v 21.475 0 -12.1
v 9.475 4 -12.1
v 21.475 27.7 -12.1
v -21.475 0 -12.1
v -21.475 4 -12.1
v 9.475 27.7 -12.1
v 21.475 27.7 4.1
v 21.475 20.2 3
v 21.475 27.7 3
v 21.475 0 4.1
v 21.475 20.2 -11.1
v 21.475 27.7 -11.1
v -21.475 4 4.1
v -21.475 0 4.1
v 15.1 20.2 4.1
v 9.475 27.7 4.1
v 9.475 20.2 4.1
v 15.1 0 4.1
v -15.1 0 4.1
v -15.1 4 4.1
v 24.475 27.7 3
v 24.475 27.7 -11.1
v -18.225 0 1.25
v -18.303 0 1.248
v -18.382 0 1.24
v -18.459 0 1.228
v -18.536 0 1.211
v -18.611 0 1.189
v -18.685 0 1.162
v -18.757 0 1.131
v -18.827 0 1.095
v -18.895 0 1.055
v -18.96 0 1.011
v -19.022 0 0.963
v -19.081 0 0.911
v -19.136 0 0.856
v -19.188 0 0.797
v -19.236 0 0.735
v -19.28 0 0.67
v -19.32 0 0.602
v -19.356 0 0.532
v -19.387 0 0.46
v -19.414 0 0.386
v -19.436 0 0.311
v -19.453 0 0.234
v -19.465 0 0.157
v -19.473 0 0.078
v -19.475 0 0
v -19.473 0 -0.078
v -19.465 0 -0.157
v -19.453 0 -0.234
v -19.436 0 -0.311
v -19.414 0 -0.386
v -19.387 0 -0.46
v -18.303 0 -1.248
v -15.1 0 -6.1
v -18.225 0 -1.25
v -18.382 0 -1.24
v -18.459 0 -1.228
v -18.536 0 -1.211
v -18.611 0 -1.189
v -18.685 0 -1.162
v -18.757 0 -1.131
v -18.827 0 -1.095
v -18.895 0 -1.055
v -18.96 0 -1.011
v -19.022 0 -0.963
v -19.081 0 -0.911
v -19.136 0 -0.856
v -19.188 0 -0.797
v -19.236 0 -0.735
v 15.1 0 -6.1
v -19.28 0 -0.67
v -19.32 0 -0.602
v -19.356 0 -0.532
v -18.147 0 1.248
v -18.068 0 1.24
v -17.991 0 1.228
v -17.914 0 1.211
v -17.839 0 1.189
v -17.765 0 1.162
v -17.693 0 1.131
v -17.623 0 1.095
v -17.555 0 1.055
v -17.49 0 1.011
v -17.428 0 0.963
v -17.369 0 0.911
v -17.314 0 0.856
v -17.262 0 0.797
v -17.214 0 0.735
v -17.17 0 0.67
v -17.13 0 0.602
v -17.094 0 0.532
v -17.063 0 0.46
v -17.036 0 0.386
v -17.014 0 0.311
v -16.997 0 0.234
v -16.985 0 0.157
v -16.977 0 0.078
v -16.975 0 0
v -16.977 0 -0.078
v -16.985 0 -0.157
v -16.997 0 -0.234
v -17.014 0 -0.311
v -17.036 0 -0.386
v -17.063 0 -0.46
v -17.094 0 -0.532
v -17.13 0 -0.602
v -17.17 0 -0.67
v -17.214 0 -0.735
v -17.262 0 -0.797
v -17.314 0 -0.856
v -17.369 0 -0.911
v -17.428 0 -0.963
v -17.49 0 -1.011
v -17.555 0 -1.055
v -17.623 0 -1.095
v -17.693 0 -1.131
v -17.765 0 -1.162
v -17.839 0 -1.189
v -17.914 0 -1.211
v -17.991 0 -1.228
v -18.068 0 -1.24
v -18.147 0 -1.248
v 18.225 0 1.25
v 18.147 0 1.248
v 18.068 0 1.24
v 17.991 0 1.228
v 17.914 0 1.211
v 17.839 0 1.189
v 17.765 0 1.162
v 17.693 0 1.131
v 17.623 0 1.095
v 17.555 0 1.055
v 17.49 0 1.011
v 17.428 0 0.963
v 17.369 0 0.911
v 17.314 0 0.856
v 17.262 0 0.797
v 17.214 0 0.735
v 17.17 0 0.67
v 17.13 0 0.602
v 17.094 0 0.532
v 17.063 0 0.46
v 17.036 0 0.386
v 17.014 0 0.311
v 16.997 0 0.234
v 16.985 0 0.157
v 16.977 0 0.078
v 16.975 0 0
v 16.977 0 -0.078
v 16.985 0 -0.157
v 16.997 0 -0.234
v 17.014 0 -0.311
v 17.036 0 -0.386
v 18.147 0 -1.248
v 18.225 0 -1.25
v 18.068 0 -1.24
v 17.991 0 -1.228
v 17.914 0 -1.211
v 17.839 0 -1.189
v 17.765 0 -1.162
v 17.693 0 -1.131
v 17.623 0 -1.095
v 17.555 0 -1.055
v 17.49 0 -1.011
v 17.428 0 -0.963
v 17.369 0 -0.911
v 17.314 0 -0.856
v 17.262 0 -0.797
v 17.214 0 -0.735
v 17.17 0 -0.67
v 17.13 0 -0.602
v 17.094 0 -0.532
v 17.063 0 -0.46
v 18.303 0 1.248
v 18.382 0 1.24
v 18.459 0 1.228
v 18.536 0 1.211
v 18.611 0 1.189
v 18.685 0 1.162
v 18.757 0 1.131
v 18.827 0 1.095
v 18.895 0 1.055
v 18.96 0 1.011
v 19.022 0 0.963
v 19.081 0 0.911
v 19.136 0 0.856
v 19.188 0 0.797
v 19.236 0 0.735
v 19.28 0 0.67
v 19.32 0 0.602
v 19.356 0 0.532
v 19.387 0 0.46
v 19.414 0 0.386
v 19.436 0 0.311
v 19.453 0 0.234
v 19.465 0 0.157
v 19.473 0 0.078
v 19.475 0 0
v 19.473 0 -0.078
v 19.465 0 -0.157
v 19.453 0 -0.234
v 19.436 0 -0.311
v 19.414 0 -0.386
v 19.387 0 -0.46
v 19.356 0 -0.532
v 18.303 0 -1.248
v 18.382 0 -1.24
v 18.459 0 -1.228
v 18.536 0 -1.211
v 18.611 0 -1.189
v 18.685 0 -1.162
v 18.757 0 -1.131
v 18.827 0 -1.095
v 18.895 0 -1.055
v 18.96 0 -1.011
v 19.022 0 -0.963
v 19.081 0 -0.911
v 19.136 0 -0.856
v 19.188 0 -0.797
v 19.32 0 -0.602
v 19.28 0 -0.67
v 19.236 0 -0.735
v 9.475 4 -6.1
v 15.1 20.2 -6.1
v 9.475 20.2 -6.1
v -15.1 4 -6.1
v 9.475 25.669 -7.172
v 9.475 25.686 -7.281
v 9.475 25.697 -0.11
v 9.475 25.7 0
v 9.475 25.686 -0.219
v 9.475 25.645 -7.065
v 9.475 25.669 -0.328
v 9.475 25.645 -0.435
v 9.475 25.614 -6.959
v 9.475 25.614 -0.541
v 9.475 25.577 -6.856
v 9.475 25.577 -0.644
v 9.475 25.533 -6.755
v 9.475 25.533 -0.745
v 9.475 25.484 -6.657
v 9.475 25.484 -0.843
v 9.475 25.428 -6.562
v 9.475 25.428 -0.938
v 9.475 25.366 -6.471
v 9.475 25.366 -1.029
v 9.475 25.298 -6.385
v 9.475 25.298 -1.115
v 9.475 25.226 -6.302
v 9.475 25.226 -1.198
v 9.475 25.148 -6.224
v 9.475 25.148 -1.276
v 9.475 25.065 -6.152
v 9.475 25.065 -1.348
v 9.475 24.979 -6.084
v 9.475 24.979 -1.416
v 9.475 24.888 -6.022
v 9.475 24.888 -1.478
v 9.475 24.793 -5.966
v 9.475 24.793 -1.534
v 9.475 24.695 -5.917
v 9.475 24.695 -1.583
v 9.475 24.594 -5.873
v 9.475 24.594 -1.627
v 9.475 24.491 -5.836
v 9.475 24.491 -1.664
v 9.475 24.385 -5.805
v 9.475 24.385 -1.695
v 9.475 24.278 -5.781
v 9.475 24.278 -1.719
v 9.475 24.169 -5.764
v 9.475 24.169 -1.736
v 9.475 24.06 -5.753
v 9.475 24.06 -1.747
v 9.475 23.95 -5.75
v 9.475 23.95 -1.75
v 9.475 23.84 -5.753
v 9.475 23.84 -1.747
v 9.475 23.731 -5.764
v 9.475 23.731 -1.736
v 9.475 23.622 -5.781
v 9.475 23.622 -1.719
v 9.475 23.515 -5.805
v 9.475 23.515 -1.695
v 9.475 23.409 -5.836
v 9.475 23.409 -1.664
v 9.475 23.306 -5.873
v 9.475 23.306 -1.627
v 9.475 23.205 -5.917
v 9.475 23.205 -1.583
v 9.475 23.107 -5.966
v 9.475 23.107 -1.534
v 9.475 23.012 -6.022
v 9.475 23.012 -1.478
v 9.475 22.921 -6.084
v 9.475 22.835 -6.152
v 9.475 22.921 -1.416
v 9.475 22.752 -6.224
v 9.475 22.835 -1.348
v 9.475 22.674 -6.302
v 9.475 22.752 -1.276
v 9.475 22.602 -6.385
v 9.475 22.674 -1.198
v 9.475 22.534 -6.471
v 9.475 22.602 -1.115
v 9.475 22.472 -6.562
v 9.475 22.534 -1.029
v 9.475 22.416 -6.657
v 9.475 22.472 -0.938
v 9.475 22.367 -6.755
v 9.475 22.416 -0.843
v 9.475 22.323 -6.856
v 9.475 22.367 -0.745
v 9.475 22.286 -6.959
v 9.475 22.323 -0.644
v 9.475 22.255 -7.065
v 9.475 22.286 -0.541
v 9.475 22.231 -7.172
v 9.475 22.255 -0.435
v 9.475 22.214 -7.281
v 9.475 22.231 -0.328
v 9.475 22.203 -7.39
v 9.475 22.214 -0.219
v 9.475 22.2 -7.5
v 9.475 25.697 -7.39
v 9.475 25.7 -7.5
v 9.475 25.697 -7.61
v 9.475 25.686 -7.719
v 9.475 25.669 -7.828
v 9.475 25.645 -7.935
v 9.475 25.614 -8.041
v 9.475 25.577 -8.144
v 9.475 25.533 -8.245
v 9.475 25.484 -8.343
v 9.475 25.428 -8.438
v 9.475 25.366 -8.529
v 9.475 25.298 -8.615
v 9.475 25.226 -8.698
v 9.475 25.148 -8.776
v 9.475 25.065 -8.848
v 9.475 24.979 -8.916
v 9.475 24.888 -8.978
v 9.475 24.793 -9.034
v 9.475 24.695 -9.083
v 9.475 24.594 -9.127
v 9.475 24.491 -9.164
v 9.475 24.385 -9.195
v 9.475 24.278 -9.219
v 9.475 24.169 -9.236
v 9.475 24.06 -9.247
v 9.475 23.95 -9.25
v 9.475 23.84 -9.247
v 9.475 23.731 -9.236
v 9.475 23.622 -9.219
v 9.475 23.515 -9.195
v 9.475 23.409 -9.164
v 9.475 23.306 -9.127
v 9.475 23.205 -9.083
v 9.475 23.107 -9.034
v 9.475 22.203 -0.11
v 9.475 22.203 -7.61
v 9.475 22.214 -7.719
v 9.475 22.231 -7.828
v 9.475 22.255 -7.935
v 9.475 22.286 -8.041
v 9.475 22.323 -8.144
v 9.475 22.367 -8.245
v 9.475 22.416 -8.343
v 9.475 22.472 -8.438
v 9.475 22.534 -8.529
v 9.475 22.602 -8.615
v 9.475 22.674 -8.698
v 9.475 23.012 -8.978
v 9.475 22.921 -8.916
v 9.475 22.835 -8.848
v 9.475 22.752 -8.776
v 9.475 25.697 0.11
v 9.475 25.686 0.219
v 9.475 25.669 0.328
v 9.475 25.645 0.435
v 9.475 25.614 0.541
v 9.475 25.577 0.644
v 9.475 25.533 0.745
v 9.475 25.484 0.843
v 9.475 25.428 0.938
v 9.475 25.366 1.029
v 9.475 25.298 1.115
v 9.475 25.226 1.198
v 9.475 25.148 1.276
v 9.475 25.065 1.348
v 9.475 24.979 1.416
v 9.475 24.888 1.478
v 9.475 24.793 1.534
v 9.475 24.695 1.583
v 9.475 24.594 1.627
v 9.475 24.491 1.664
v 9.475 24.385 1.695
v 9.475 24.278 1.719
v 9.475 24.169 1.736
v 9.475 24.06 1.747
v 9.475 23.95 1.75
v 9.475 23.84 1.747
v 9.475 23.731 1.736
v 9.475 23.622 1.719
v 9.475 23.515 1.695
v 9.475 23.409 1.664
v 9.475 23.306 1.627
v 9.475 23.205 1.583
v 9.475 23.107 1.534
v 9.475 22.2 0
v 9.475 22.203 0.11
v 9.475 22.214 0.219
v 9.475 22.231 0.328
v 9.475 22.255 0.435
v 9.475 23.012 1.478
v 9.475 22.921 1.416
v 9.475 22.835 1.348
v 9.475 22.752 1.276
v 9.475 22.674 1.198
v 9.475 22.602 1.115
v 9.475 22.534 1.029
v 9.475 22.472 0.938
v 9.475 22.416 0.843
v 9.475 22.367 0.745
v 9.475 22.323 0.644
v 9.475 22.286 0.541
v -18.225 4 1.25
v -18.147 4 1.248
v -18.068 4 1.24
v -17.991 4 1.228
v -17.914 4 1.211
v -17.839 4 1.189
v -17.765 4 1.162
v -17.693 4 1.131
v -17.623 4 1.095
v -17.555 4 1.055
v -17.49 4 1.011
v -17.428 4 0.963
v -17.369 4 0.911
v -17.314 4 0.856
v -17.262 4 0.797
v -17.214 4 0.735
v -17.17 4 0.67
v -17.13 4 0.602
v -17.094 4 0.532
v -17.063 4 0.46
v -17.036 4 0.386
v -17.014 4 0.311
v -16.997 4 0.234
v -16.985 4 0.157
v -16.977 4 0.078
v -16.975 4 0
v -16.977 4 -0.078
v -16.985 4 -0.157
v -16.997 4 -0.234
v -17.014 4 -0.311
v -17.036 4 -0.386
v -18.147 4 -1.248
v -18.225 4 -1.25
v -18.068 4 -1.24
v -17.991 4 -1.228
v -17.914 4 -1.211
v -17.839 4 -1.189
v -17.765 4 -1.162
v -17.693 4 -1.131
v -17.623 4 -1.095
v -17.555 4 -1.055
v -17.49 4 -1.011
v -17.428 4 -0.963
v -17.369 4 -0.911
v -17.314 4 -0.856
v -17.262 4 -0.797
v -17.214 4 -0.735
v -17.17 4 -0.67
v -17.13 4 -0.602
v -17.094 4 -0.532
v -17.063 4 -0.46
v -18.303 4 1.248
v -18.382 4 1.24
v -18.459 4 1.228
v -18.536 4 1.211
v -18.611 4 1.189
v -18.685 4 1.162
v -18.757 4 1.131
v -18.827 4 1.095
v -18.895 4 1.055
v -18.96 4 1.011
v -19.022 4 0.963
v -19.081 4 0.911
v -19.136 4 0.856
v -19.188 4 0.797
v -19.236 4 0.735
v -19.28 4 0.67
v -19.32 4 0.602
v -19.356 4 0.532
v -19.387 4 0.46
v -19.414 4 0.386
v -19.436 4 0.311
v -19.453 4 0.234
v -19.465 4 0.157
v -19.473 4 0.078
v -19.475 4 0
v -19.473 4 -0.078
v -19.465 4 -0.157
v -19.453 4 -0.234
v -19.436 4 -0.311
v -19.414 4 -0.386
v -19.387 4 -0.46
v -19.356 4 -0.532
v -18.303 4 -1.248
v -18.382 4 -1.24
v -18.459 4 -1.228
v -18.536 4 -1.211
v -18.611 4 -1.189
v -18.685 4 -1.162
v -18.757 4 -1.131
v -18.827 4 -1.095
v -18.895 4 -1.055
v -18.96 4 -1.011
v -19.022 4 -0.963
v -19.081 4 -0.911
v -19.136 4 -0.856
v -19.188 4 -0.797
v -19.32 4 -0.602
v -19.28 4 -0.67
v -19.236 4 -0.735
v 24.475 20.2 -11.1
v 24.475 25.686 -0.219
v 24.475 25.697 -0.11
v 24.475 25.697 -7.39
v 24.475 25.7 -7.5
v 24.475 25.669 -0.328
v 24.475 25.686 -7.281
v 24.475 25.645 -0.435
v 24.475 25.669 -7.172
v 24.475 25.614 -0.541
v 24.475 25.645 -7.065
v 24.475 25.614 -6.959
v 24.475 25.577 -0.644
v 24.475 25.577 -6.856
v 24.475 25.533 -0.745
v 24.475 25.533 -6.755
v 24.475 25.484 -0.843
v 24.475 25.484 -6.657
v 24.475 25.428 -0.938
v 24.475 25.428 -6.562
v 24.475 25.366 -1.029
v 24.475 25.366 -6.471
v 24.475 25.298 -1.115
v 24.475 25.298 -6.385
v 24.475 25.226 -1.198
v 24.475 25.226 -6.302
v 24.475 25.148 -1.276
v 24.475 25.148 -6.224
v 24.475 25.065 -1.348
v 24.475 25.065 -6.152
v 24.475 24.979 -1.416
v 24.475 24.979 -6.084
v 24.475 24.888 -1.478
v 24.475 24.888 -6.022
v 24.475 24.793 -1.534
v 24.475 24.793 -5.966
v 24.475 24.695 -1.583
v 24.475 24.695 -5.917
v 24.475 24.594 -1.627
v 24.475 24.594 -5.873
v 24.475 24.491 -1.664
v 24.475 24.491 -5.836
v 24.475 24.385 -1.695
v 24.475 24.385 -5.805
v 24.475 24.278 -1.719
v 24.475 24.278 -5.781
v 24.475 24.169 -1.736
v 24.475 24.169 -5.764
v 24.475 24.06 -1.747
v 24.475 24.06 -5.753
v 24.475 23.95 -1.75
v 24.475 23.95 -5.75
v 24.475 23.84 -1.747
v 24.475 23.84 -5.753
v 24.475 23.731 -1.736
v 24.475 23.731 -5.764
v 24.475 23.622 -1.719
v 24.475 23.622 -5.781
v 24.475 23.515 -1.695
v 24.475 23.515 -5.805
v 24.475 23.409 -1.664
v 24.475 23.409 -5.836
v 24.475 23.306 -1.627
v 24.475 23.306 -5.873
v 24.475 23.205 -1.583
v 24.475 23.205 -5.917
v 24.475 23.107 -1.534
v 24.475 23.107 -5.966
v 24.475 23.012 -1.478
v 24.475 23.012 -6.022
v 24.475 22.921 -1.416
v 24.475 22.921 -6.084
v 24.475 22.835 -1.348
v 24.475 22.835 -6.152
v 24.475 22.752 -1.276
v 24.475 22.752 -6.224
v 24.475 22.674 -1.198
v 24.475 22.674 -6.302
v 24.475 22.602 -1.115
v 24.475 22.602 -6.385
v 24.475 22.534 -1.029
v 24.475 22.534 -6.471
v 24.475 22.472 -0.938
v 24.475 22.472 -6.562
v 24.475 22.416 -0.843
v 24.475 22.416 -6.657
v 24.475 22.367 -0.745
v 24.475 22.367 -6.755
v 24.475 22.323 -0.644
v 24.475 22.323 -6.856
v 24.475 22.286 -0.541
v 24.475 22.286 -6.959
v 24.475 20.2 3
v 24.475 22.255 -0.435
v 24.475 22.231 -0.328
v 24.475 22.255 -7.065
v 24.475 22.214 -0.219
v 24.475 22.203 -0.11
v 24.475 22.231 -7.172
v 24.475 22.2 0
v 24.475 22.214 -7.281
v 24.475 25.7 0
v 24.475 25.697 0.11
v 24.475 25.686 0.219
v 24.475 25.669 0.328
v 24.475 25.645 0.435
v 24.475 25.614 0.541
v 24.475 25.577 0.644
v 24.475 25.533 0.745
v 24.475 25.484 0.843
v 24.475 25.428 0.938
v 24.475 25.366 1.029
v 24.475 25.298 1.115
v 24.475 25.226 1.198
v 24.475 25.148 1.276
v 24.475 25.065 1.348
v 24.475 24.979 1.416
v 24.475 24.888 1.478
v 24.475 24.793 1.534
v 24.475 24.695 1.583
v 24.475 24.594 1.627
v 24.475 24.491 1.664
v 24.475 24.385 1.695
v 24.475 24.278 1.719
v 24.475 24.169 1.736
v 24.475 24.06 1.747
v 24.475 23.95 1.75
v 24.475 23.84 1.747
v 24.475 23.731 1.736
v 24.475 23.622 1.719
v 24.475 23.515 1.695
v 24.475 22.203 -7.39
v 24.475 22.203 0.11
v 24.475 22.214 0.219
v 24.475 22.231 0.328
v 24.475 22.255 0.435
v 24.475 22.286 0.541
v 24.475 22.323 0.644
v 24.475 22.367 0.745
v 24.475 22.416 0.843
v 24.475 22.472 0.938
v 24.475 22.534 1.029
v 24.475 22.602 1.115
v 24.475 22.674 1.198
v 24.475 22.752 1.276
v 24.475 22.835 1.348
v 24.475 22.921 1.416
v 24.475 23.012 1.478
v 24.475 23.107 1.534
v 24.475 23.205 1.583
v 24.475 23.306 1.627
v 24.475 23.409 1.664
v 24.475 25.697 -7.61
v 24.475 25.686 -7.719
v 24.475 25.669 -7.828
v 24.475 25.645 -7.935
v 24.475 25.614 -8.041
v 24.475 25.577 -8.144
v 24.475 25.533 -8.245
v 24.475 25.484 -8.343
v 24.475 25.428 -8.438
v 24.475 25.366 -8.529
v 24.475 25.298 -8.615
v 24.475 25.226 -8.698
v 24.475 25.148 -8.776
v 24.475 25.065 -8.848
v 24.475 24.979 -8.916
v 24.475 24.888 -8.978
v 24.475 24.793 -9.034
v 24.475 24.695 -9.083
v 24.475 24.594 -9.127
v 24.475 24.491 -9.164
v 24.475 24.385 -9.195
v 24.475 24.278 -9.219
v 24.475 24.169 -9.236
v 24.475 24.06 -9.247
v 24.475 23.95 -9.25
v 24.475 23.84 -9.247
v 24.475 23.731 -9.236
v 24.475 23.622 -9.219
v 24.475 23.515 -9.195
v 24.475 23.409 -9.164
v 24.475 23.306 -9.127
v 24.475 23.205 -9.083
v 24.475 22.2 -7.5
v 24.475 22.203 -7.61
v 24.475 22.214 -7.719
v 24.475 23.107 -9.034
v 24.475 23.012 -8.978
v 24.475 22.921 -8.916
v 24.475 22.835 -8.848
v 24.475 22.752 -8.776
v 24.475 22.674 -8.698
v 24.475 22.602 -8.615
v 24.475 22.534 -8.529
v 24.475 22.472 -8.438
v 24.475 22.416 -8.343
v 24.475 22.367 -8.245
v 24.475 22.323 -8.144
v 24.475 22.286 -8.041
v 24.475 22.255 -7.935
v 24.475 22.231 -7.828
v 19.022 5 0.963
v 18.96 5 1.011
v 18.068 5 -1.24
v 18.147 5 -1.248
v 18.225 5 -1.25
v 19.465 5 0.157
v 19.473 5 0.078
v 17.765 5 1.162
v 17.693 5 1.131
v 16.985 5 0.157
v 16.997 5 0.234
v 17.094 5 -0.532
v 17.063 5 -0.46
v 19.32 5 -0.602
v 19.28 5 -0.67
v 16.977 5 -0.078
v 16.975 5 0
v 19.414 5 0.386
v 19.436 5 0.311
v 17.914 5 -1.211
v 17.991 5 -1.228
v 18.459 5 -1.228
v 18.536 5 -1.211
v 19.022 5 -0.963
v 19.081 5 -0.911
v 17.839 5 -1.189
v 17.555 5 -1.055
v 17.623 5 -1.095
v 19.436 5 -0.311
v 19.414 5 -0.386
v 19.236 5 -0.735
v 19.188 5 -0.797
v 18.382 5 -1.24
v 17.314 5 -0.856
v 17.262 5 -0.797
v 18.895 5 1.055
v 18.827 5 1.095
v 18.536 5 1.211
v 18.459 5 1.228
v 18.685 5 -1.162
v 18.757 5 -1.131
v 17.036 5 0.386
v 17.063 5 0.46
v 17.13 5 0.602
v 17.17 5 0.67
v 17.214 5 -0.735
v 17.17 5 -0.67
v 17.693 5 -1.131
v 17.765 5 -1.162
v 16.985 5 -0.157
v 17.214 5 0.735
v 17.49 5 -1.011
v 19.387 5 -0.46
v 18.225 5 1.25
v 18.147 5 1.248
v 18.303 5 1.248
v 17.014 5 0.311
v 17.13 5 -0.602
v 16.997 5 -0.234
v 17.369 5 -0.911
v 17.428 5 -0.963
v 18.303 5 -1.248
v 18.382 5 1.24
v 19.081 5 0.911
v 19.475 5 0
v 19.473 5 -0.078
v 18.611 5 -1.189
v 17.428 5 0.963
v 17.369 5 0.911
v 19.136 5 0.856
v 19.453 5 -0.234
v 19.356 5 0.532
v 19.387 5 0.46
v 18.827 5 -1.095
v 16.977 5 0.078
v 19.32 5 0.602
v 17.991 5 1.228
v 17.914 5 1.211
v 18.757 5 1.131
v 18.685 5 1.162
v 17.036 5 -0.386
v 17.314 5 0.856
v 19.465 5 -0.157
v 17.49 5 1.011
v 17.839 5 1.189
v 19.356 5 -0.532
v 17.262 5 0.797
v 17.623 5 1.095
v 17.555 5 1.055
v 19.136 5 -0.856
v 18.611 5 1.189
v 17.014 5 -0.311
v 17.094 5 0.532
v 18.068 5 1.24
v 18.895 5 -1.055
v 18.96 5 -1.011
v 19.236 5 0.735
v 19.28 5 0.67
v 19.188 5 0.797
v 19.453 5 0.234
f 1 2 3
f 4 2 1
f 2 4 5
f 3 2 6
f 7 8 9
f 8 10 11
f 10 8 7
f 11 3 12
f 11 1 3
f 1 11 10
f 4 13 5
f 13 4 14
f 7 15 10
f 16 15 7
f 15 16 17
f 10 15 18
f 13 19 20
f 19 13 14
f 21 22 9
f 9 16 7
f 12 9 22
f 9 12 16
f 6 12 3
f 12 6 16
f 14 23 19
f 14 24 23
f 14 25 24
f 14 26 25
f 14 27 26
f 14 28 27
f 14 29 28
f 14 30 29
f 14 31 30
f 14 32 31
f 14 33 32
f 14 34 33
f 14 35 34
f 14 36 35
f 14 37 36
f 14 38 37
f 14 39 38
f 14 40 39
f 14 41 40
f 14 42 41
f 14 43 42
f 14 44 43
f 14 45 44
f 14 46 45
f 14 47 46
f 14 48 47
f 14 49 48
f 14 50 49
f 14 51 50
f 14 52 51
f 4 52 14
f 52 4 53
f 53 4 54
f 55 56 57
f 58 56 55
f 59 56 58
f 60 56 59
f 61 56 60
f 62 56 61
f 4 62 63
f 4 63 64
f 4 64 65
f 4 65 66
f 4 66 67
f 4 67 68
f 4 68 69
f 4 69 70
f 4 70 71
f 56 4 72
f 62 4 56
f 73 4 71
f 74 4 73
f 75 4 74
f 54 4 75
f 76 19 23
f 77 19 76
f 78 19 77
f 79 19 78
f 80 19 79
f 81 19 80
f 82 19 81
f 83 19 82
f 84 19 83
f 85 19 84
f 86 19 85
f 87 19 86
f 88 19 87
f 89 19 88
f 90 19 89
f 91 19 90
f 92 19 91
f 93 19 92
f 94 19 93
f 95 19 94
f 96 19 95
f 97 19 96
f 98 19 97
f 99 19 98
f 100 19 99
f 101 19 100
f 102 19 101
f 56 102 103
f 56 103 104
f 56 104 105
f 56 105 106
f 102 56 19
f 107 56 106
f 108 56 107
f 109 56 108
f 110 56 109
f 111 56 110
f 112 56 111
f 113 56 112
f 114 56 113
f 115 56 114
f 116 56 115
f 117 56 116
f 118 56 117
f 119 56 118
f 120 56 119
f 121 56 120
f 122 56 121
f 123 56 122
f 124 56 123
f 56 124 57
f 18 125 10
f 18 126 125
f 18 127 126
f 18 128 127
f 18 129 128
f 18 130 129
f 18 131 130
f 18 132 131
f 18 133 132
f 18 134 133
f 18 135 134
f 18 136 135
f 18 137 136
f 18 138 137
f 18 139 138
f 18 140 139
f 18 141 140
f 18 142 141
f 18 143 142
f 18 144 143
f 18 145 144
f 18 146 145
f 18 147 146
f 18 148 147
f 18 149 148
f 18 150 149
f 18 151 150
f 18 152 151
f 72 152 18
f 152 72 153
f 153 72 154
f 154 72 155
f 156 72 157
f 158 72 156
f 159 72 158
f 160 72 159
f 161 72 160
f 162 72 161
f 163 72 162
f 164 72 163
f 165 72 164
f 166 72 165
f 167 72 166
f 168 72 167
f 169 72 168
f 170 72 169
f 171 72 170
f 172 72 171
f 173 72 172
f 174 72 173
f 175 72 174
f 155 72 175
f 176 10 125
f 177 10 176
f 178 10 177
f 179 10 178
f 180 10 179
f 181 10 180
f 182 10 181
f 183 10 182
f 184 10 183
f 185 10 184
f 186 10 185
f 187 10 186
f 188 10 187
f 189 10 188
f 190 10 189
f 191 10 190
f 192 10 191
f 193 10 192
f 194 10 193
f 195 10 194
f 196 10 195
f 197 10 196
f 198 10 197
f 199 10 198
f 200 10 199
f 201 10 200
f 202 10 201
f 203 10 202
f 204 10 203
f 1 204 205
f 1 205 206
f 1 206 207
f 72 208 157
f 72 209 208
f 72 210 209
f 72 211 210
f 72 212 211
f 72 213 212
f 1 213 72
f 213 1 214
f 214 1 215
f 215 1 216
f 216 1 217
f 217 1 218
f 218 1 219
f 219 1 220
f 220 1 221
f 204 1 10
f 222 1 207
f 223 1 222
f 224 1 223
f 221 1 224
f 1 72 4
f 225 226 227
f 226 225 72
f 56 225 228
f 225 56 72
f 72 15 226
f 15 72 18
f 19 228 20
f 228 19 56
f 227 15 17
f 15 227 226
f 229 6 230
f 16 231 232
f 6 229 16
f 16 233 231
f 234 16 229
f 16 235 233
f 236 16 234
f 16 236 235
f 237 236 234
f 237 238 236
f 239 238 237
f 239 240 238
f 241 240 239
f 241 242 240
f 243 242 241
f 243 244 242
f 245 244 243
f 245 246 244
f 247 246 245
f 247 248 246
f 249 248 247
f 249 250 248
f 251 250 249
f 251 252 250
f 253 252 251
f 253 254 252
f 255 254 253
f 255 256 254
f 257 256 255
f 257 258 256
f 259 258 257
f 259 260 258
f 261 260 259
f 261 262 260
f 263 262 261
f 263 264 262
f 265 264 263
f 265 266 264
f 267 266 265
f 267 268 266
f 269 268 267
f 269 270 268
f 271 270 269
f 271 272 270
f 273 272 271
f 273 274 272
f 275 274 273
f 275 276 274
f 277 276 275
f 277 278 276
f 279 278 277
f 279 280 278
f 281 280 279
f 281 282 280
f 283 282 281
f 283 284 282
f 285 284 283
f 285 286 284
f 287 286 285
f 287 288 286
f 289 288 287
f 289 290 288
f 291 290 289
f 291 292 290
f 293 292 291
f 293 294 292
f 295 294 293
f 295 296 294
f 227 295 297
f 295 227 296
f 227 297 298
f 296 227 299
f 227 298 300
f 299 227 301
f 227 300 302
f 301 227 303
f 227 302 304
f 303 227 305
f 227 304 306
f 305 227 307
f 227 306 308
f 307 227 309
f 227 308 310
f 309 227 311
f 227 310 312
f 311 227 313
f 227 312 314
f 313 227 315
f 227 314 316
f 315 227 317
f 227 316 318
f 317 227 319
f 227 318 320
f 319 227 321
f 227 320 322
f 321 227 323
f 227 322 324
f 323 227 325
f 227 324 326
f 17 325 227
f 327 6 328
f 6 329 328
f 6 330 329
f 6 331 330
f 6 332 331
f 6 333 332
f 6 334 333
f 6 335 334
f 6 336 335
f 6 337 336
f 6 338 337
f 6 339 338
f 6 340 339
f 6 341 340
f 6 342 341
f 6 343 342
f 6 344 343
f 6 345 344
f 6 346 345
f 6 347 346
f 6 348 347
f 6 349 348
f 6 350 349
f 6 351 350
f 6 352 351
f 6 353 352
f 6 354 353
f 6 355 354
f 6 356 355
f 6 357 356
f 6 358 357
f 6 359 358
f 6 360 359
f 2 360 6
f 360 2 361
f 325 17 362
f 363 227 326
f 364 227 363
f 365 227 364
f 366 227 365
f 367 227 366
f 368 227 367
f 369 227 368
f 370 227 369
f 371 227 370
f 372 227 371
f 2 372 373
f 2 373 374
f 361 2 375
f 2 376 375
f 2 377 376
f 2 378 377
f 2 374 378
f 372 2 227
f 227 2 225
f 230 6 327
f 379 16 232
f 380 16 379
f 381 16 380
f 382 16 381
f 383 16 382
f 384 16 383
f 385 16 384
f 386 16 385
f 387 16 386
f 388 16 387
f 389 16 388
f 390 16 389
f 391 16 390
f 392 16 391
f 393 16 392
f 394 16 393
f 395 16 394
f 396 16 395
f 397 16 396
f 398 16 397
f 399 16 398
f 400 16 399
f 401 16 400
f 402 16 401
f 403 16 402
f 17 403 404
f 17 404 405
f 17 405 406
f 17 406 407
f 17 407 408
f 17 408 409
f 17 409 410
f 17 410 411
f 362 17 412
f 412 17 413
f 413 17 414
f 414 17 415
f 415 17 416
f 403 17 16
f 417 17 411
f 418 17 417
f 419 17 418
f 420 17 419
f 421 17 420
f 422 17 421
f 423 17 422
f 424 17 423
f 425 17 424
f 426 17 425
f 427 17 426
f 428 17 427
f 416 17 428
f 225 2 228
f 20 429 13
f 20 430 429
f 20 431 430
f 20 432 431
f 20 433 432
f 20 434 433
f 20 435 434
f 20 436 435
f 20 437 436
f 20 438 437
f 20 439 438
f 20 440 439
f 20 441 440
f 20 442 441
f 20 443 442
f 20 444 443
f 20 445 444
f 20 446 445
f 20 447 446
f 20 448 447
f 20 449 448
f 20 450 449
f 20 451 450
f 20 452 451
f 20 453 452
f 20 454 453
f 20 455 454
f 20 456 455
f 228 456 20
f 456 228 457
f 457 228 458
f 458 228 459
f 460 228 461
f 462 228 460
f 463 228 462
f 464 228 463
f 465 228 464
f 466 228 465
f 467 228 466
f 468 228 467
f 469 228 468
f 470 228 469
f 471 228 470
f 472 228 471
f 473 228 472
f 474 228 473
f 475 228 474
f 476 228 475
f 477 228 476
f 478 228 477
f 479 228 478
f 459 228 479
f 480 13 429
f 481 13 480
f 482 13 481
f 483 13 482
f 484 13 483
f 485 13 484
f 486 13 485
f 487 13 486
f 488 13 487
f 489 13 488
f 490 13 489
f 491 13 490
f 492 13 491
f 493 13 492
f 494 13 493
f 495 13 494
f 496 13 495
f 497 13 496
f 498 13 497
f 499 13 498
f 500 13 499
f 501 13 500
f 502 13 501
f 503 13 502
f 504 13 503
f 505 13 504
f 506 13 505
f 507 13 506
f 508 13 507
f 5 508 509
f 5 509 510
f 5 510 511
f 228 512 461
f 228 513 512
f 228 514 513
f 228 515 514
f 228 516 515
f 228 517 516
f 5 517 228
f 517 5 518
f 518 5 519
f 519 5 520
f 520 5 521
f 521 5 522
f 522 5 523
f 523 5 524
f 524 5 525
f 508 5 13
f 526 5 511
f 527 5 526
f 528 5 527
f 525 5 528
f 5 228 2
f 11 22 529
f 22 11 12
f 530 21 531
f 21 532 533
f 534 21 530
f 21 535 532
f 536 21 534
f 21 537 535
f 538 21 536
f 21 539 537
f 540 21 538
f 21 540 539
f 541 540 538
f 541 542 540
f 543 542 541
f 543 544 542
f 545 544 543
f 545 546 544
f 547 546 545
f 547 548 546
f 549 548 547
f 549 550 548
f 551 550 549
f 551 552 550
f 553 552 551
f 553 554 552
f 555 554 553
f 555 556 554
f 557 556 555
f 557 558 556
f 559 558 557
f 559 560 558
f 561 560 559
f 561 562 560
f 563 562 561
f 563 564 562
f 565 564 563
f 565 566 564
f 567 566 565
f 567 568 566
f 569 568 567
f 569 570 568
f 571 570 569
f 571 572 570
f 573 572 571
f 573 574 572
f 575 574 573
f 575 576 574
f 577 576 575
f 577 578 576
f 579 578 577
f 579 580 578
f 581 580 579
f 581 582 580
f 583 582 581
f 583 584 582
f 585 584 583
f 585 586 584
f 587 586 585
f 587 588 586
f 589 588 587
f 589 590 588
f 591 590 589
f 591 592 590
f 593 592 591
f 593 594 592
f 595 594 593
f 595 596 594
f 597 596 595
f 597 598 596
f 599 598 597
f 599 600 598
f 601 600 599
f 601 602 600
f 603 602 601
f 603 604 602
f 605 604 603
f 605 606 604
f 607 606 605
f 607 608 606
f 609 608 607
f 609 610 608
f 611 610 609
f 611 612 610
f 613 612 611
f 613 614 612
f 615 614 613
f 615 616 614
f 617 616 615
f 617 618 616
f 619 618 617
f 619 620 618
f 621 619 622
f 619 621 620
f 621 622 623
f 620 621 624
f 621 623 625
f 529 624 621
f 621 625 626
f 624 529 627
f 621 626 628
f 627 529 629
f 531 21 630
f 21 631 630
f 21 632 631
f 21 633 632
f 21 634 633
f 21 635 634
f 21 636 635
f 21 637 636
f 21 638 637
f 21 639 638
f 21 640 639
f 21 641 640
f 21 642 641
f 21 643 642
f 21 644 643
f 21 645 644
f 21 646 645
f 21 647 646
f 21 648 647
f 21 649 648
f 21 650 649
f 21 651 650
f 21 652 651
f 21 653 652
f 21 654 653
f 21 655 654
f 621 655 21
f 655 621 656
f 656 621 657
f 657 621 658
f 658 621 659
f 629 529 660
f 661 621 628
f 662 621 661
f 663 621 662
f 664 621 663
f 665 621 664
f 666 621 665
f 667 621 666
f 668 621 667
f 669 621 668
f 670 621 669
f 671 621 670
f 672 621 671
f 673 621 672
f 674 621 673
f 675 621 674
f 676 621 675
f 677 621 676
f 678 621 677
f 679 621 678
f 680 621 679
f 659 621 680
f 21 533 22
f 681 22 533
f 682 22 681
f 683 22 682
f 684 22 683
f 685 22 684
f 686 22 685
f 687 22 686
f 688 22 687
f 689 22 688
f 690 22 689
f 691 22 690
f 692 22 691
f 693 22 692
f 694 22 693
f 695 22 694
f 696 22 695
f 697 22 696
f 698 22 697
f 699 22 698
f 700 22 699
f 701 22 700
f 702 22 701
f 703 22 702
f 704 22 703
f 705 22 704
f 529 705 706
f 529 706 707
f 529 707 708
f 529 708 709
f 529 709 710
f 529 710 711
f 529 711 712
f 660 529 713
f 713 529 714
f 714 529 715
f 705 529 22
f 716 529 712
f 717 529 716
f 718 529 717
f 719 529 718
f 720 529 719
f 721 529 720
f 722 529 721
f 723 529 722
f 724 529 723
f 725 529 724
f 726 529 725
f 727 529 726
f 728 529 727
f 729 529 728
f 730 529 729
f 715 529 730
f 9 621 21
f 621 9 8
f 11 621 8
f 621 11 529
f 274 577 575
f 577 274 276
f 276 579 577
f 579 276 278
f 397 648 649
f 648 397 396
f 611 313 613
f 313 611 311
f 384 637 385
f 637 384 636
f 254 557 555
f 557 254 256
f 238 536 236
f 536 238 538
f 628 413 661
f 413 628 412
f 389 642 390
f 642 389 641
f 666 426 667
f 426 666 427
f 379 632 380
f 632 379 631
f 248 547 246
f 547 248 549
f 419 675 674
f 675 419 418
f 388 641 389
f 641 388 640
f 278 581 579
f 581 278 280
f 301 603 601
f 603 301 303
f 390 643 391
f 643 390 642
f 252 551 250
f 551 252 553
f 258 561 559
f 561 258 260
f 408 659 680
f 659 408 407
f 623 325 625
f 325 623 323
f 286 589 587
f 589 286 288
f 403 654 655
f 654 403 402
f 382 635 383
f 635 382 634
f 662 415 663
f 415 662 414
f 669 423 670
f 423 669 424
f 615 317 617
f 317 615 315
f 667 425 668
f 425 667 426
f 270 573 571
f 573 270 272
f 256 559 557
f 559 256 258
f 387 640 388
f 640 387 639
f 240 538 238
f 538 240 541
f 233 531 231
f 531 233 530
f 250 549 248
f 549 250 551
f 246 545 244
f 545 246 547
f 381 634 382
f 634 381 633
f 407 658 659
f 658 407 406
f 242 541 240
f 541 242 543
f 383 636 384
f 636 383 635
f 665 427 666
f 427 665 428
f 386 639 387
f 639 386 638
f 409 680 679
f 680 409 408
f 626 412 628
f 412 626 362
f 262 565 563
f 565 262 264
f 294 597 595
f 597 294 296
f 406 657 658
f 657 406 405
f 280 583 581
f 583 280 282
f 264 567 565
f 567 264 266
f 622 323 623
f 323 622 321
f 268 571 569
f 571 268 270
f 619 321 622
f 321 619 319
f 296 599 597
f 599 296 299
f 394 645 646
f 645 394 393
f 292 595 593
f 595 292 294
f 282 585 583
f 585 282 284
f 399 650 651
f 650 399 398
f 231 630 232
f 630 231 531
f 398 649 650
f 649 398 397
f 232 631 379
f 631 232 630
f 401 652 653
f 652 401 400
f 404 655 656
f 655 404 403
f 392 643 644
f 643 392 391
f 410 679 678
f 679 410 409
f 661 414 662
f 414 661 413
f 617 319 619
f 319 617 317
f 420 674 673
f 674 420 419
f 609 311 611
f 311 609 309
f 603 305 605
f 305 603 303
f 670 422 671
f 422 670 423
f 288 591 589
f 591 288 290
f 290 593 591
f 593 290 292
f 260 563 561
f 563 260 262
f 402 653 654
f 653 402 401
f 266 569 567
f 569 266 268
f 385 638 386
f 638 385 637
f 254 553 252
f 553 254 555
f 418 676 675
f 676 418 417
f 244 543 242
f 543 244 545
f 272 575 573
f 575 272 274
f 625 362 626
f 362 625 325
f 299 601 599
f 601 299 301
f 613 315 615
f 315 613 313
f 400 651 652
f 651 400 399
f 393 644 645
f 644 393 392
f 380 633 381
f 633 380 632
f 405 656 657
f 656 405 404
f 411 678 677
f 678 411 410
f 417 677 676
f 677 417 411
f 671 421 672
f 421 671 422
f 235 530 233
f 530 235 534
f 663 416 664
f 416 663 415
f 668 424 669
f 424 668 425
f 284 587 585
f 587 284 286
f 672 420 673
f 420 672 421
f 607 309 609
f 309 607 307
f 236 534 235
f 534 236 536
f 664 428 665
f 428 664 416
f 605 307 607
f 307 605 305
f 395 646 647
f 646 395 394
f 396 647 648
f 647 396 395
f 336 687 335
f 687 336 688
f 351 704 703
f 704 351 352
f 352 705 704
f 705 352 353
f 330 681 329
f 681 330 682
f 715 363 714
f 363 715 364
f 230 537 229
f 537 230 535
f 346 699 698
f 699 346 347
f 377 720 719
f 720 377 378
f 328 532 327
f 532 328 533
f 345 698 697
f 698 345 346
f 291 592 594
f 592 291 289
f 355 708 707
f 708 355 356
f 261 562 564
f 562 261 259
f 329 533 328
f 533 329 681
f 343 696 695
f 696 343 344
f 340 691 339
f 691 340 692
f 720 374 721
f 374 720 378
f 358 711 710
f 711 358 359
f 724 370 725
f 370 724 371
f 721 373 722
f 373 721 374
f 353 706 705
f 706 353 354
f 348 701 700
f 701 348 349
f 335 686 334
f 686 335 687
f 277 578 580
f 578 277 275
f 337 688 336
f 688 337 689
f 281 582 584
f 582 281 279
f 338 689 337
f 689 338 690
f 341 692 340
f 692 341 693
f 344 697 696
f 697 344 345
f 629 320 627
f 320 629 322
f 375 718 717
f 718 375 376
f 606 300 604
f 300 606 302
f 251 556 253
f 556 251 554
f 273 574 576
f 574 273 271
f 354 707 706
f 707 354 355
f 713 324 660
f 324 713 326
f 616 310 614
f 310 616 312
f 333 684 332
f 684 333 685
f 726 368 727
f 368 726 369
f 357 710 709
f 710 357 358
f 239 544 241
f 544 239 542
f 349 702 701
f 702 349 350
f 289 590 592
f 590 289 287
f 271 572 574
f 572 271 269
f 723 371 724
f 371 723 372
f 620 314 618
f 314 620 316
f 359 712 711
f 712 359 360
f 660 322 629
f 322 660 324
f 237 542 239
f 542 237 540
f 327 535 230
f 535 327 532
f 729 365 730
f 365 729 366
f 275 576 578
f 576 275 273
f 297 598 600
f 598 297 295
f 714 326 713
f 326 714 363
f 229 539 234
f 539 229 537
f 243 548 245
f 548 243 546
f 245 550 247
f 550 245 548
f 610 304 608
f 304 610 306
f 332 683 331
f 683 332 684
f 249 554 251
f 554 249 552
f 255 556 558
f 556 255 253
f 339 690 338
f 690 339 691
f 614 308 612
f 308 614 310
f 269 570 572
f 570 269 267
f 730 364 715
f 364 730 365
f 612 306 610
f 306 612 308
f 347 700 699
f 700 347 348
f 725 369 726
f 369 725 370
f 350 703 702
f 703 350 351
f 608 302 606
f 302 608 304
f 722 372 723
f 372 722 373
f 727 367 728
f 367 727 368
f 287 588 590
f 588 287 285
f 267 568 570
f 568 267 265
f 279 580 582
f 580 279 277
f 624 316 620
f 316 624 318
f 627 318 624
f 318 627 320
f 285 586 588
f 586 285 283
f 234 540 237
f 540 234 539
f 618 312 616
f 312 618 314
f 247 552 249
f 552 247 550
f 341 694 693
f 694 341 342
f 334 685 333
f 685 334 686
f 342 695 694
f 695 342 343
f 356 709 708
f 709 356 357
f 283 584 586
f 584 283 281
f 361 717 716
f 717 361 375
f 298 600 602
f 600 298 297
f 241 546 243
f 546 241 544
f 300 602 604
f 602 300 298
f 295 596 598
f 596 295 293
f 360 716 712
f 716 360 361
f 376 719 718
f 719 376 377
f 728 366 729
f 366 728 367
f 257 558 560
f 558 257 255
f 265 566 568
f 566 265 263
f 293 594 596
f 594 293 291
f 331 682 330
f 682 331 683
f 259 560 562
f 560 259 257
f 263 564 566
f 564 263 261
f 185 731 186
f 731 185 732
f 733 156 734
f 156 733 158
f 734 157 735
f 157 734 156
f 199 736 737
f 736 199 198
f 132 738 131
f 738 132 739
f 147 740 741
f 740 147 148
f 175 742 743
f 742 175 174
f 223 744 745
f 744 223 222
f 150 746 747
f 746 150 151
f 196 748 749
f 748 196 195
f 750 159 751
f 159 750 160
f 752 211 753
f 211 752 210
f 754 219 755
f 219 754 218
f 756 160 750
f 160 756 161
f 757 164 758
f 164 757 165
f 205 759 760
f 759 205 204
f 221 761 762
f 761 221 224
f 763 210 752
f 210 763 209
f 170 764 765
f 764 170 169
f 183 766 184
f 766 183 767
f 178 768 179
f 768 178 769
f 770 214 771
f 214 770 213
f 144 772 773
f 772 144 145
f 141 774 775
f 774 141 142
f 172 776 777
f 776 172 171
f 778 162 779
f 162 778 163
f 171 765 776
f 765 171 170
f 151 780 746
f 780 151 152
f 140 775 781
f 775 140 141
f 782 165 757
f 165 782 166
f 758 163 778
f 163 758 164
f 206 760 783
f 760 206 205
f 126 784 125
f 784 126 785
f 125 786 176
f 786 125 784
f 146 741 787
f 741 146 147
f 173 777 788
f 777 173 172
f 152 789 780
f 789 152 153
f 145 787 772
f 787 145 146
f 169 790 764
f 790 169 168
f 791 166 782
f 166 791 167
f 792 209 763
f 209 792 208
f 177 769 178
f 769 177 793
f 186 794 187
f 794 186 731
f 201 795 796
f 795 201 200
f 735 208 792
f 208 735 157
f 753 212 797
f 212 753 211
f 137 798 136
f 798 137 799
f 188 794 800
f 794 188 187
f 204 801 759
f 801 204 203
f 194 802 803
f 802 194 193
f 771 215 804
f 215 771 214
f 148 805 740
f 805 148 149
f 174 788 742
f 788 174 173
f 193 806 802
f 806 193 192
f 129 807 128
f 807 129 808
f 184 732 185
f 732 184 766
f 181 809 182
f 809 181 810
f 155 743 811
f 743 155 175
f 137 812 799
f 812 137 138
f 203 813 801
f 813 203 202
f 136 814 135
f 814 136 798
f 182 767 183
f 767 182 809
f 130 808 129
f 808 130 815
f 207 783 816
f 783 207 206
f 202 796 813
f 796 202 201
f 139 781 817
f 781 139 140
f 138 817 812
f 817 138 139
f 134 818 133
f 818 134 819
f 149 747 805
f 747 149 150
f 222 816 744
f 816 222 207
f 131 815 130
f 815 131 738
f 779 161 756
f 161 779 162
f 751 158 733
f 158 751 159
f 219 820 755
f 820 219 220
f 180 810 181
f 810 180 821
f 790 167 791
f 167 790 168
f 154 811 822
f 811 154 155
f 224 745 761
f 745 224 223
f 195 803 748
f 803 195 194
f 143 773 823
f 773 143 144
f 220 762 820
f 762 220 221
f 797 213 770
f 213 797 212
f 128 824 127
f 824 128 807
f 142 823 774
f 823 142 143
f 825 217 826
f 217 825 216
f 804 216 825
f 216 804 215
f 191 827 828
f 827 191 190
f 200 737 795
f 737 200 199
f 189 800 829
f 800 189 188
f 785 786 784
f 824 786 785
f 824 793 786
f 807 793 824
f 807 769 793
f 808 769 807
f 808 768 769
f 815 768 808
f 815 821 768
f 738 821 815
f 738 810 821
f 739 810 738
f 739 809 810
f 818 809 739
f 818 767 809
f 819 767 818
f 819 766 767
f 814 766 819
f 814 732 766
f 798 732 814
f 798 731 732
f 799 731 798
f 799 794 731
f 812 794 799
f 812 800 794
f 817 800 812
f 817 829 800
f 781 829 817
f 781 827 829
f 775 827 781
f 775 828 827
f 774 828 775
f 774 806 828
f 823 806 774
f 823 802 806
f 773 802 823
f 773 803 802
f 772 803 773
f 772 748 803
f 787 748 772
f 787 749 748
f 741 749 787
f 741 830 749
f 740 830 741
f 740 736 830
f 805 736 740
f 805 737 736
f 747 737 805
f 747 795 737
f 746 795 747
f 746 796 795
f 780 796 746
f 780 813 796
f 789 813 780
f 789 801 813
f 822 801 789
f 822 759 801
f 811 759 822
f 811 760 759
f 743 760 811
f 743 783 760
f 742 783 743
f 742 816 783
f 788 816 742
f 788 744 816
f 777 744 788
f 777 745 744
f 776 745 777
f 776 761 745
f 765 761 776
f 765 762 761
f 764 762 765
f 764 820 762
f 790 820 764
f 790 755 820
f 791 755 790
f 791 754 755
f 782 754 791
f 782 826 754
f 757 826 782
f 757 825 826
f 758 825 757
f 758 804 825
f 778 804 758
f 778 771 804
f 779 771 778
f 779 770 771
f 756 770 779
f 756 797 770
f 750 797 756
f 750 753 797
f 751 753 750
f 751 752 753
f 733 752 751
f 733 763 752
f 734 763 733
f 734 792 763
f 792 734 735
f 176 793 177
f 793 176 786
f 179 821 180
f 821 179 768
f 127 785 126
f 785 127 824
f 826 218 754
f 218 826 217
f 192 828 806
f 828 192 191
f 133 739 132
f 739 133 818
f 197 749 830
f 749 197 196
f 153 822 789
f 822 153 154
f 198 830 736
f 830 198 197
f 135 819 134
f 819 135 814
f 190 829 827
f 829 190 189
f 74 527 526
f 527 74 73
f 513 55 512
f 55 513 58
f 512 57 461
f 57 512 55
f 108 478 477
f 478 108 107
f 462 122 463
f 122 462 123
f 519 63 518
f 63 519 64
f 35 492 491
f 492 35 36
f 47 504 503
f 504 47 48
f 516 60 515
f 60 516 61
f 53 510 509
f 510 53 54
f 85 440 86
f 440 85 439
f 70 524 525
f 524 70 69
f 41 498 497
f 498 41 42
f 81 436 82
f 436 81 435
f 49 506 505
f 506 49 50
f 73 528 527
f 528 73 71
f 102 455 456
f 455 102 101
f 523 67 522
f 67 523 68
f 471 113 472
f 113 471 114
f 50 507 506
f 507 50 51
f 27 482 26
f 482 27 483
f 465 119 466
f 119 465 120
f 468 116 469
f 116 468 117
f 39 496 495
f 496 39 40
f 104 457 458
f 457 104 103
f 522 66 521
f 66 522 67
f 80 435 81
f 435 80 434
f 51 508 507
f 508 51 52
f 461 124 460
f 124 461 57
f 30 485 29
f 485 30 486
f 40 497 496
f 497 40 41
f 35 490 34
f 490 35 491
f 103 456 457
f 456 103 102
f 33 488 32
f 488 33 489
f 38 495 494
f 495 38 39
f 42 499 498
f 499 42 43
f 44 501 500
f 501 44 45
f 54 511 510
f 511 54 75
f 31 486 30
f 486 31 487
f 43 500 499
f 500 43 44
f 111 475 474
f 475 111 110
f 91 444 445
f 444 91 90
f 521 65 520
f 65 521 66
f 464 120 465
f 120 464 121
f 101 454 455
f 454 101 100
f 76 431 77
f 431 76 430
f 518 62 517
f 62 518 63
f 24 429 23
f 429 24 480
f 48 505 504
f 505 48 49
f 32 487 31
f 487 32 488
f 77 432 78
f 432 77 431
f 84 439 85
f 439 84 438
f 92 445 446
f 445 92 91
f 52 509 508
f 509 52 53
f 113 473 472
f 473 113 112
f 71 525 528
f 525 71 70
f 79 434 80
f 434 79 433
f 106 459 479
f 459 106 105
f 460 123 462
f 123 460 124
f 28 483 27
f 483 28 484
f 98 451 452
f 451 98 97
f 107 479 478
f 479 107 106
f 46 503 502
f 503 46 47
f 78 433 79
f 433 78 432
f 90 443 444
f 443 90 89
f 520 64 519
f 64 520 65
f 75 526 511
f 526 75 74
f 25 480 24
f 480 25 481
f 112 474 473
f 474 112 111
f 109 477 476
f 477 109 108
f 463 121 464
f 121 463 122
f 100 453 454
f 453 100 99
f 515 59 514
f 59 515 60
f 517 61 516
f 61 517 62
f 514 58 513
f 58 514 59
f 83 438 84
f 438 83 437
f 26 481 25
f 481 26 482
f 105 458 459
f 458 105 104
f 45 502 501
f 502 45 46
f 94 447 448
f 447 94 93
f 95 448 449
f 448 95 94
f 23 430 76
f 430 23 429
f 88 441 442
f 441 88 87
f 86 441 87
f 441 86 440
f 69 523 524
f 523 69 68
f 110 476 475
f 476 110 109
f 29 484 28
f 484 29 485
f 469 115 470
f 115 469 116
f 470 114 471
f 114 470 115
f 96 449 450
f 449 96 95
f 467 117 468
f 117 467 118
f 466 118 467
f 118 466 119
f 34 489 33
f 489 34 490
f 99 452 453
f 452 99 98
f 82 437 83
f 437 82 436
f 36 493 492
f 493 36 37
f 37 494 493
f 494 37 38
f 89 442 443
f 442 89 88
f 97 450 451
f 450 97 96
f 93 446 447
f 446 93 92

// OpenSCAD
$fn=100;

wall=2;
clearance=0.2;
arm_thickness=4;

// HS81
servo_len=29.8;
servo_w=12;
servo_hole_h=5.4;         // From edge of servo body to middle of hole
servo_hole_offset=3.125;  // From body to middle of mounting hole
servo_screw_d=2.5;       // M3 self tapping tap hole
servo_hole_to_bottom=20; // distance from the mounting hole to bottom of servo

mounting_screw_d=3.5;     // M3 self tapping through hole
mounting_extra_len=3;
mounting_screw_len=15;
servo_screw_len=5;

mount=[ servo_w + arm_thickness + clearance,
         servo_hole_to_bottom + clearance + wall + mounting_screw_d + wall,
         servo_len + 2 * (clearance + servo_hole_offset + servo_screw_d/2 + wall)
        ];

servo = [ servo_w + clearance, servo_hole_to_bottom + clearance, servo_len + clearance * 2 ];

module body() {
    difference() {
        translate([-mount[0]/2 + arm_thickness, 0, -mount[2]/2]) cube(mount);
        translate([-servo[0]/2, 0, -servo[2]/2]) cube(servo);
        translate([-mount[0]/2 + arm_thickness, arm_thickness, -mount[2] + mount[2]/2-mounting_screw_len+mounting_extra_len ]) cube(mount);
    };
}

module mounting_screw_extra() {
    tapered_cylinder(d0=mounting_screw_d + 0.5, d1=mounting_screw_d + 2*wall, h=mounting_extra_len);
}

module mounting_extra_body() {
    translate([-wall*1.5, mount[1] - wall*2 - mounting_screw_d, mount[2]/2]) cube([mount[0]/2 + arm_thickness + wall, mounting_screw_d + wall*2, mounting_extra_len]);
}

module servo_hole() {
    rotate([-90, 0, 0]) cylinder(d=servo_screw_d, h=servo_screw_len);
};

module full_mount() {
    difference() {
        union() {
            body();
            mounting_extra_body();
        }
        translate([0, 0, servo_len/2 + servo_hole_offset + clearance]) servo_hole();
        translate([0, 0, -(servo_len/2 + servo_hole_offset + clearance)]) servo_hole();
        translate([0, mount[1] - wall - mounting_screw_d/2, 0]) union() {
            cylinder(d=mounting_screw_d, h=mount[2] + mounting_extra_len);
            translate([arm_thickness + mounting_screw_d, 0, 0]) cylinder(d=mounting_screw_d, h=mount[2] + mounting_extra_len);
        };
    };
}

rotate([0, 90, 0]) 
full_mount();
